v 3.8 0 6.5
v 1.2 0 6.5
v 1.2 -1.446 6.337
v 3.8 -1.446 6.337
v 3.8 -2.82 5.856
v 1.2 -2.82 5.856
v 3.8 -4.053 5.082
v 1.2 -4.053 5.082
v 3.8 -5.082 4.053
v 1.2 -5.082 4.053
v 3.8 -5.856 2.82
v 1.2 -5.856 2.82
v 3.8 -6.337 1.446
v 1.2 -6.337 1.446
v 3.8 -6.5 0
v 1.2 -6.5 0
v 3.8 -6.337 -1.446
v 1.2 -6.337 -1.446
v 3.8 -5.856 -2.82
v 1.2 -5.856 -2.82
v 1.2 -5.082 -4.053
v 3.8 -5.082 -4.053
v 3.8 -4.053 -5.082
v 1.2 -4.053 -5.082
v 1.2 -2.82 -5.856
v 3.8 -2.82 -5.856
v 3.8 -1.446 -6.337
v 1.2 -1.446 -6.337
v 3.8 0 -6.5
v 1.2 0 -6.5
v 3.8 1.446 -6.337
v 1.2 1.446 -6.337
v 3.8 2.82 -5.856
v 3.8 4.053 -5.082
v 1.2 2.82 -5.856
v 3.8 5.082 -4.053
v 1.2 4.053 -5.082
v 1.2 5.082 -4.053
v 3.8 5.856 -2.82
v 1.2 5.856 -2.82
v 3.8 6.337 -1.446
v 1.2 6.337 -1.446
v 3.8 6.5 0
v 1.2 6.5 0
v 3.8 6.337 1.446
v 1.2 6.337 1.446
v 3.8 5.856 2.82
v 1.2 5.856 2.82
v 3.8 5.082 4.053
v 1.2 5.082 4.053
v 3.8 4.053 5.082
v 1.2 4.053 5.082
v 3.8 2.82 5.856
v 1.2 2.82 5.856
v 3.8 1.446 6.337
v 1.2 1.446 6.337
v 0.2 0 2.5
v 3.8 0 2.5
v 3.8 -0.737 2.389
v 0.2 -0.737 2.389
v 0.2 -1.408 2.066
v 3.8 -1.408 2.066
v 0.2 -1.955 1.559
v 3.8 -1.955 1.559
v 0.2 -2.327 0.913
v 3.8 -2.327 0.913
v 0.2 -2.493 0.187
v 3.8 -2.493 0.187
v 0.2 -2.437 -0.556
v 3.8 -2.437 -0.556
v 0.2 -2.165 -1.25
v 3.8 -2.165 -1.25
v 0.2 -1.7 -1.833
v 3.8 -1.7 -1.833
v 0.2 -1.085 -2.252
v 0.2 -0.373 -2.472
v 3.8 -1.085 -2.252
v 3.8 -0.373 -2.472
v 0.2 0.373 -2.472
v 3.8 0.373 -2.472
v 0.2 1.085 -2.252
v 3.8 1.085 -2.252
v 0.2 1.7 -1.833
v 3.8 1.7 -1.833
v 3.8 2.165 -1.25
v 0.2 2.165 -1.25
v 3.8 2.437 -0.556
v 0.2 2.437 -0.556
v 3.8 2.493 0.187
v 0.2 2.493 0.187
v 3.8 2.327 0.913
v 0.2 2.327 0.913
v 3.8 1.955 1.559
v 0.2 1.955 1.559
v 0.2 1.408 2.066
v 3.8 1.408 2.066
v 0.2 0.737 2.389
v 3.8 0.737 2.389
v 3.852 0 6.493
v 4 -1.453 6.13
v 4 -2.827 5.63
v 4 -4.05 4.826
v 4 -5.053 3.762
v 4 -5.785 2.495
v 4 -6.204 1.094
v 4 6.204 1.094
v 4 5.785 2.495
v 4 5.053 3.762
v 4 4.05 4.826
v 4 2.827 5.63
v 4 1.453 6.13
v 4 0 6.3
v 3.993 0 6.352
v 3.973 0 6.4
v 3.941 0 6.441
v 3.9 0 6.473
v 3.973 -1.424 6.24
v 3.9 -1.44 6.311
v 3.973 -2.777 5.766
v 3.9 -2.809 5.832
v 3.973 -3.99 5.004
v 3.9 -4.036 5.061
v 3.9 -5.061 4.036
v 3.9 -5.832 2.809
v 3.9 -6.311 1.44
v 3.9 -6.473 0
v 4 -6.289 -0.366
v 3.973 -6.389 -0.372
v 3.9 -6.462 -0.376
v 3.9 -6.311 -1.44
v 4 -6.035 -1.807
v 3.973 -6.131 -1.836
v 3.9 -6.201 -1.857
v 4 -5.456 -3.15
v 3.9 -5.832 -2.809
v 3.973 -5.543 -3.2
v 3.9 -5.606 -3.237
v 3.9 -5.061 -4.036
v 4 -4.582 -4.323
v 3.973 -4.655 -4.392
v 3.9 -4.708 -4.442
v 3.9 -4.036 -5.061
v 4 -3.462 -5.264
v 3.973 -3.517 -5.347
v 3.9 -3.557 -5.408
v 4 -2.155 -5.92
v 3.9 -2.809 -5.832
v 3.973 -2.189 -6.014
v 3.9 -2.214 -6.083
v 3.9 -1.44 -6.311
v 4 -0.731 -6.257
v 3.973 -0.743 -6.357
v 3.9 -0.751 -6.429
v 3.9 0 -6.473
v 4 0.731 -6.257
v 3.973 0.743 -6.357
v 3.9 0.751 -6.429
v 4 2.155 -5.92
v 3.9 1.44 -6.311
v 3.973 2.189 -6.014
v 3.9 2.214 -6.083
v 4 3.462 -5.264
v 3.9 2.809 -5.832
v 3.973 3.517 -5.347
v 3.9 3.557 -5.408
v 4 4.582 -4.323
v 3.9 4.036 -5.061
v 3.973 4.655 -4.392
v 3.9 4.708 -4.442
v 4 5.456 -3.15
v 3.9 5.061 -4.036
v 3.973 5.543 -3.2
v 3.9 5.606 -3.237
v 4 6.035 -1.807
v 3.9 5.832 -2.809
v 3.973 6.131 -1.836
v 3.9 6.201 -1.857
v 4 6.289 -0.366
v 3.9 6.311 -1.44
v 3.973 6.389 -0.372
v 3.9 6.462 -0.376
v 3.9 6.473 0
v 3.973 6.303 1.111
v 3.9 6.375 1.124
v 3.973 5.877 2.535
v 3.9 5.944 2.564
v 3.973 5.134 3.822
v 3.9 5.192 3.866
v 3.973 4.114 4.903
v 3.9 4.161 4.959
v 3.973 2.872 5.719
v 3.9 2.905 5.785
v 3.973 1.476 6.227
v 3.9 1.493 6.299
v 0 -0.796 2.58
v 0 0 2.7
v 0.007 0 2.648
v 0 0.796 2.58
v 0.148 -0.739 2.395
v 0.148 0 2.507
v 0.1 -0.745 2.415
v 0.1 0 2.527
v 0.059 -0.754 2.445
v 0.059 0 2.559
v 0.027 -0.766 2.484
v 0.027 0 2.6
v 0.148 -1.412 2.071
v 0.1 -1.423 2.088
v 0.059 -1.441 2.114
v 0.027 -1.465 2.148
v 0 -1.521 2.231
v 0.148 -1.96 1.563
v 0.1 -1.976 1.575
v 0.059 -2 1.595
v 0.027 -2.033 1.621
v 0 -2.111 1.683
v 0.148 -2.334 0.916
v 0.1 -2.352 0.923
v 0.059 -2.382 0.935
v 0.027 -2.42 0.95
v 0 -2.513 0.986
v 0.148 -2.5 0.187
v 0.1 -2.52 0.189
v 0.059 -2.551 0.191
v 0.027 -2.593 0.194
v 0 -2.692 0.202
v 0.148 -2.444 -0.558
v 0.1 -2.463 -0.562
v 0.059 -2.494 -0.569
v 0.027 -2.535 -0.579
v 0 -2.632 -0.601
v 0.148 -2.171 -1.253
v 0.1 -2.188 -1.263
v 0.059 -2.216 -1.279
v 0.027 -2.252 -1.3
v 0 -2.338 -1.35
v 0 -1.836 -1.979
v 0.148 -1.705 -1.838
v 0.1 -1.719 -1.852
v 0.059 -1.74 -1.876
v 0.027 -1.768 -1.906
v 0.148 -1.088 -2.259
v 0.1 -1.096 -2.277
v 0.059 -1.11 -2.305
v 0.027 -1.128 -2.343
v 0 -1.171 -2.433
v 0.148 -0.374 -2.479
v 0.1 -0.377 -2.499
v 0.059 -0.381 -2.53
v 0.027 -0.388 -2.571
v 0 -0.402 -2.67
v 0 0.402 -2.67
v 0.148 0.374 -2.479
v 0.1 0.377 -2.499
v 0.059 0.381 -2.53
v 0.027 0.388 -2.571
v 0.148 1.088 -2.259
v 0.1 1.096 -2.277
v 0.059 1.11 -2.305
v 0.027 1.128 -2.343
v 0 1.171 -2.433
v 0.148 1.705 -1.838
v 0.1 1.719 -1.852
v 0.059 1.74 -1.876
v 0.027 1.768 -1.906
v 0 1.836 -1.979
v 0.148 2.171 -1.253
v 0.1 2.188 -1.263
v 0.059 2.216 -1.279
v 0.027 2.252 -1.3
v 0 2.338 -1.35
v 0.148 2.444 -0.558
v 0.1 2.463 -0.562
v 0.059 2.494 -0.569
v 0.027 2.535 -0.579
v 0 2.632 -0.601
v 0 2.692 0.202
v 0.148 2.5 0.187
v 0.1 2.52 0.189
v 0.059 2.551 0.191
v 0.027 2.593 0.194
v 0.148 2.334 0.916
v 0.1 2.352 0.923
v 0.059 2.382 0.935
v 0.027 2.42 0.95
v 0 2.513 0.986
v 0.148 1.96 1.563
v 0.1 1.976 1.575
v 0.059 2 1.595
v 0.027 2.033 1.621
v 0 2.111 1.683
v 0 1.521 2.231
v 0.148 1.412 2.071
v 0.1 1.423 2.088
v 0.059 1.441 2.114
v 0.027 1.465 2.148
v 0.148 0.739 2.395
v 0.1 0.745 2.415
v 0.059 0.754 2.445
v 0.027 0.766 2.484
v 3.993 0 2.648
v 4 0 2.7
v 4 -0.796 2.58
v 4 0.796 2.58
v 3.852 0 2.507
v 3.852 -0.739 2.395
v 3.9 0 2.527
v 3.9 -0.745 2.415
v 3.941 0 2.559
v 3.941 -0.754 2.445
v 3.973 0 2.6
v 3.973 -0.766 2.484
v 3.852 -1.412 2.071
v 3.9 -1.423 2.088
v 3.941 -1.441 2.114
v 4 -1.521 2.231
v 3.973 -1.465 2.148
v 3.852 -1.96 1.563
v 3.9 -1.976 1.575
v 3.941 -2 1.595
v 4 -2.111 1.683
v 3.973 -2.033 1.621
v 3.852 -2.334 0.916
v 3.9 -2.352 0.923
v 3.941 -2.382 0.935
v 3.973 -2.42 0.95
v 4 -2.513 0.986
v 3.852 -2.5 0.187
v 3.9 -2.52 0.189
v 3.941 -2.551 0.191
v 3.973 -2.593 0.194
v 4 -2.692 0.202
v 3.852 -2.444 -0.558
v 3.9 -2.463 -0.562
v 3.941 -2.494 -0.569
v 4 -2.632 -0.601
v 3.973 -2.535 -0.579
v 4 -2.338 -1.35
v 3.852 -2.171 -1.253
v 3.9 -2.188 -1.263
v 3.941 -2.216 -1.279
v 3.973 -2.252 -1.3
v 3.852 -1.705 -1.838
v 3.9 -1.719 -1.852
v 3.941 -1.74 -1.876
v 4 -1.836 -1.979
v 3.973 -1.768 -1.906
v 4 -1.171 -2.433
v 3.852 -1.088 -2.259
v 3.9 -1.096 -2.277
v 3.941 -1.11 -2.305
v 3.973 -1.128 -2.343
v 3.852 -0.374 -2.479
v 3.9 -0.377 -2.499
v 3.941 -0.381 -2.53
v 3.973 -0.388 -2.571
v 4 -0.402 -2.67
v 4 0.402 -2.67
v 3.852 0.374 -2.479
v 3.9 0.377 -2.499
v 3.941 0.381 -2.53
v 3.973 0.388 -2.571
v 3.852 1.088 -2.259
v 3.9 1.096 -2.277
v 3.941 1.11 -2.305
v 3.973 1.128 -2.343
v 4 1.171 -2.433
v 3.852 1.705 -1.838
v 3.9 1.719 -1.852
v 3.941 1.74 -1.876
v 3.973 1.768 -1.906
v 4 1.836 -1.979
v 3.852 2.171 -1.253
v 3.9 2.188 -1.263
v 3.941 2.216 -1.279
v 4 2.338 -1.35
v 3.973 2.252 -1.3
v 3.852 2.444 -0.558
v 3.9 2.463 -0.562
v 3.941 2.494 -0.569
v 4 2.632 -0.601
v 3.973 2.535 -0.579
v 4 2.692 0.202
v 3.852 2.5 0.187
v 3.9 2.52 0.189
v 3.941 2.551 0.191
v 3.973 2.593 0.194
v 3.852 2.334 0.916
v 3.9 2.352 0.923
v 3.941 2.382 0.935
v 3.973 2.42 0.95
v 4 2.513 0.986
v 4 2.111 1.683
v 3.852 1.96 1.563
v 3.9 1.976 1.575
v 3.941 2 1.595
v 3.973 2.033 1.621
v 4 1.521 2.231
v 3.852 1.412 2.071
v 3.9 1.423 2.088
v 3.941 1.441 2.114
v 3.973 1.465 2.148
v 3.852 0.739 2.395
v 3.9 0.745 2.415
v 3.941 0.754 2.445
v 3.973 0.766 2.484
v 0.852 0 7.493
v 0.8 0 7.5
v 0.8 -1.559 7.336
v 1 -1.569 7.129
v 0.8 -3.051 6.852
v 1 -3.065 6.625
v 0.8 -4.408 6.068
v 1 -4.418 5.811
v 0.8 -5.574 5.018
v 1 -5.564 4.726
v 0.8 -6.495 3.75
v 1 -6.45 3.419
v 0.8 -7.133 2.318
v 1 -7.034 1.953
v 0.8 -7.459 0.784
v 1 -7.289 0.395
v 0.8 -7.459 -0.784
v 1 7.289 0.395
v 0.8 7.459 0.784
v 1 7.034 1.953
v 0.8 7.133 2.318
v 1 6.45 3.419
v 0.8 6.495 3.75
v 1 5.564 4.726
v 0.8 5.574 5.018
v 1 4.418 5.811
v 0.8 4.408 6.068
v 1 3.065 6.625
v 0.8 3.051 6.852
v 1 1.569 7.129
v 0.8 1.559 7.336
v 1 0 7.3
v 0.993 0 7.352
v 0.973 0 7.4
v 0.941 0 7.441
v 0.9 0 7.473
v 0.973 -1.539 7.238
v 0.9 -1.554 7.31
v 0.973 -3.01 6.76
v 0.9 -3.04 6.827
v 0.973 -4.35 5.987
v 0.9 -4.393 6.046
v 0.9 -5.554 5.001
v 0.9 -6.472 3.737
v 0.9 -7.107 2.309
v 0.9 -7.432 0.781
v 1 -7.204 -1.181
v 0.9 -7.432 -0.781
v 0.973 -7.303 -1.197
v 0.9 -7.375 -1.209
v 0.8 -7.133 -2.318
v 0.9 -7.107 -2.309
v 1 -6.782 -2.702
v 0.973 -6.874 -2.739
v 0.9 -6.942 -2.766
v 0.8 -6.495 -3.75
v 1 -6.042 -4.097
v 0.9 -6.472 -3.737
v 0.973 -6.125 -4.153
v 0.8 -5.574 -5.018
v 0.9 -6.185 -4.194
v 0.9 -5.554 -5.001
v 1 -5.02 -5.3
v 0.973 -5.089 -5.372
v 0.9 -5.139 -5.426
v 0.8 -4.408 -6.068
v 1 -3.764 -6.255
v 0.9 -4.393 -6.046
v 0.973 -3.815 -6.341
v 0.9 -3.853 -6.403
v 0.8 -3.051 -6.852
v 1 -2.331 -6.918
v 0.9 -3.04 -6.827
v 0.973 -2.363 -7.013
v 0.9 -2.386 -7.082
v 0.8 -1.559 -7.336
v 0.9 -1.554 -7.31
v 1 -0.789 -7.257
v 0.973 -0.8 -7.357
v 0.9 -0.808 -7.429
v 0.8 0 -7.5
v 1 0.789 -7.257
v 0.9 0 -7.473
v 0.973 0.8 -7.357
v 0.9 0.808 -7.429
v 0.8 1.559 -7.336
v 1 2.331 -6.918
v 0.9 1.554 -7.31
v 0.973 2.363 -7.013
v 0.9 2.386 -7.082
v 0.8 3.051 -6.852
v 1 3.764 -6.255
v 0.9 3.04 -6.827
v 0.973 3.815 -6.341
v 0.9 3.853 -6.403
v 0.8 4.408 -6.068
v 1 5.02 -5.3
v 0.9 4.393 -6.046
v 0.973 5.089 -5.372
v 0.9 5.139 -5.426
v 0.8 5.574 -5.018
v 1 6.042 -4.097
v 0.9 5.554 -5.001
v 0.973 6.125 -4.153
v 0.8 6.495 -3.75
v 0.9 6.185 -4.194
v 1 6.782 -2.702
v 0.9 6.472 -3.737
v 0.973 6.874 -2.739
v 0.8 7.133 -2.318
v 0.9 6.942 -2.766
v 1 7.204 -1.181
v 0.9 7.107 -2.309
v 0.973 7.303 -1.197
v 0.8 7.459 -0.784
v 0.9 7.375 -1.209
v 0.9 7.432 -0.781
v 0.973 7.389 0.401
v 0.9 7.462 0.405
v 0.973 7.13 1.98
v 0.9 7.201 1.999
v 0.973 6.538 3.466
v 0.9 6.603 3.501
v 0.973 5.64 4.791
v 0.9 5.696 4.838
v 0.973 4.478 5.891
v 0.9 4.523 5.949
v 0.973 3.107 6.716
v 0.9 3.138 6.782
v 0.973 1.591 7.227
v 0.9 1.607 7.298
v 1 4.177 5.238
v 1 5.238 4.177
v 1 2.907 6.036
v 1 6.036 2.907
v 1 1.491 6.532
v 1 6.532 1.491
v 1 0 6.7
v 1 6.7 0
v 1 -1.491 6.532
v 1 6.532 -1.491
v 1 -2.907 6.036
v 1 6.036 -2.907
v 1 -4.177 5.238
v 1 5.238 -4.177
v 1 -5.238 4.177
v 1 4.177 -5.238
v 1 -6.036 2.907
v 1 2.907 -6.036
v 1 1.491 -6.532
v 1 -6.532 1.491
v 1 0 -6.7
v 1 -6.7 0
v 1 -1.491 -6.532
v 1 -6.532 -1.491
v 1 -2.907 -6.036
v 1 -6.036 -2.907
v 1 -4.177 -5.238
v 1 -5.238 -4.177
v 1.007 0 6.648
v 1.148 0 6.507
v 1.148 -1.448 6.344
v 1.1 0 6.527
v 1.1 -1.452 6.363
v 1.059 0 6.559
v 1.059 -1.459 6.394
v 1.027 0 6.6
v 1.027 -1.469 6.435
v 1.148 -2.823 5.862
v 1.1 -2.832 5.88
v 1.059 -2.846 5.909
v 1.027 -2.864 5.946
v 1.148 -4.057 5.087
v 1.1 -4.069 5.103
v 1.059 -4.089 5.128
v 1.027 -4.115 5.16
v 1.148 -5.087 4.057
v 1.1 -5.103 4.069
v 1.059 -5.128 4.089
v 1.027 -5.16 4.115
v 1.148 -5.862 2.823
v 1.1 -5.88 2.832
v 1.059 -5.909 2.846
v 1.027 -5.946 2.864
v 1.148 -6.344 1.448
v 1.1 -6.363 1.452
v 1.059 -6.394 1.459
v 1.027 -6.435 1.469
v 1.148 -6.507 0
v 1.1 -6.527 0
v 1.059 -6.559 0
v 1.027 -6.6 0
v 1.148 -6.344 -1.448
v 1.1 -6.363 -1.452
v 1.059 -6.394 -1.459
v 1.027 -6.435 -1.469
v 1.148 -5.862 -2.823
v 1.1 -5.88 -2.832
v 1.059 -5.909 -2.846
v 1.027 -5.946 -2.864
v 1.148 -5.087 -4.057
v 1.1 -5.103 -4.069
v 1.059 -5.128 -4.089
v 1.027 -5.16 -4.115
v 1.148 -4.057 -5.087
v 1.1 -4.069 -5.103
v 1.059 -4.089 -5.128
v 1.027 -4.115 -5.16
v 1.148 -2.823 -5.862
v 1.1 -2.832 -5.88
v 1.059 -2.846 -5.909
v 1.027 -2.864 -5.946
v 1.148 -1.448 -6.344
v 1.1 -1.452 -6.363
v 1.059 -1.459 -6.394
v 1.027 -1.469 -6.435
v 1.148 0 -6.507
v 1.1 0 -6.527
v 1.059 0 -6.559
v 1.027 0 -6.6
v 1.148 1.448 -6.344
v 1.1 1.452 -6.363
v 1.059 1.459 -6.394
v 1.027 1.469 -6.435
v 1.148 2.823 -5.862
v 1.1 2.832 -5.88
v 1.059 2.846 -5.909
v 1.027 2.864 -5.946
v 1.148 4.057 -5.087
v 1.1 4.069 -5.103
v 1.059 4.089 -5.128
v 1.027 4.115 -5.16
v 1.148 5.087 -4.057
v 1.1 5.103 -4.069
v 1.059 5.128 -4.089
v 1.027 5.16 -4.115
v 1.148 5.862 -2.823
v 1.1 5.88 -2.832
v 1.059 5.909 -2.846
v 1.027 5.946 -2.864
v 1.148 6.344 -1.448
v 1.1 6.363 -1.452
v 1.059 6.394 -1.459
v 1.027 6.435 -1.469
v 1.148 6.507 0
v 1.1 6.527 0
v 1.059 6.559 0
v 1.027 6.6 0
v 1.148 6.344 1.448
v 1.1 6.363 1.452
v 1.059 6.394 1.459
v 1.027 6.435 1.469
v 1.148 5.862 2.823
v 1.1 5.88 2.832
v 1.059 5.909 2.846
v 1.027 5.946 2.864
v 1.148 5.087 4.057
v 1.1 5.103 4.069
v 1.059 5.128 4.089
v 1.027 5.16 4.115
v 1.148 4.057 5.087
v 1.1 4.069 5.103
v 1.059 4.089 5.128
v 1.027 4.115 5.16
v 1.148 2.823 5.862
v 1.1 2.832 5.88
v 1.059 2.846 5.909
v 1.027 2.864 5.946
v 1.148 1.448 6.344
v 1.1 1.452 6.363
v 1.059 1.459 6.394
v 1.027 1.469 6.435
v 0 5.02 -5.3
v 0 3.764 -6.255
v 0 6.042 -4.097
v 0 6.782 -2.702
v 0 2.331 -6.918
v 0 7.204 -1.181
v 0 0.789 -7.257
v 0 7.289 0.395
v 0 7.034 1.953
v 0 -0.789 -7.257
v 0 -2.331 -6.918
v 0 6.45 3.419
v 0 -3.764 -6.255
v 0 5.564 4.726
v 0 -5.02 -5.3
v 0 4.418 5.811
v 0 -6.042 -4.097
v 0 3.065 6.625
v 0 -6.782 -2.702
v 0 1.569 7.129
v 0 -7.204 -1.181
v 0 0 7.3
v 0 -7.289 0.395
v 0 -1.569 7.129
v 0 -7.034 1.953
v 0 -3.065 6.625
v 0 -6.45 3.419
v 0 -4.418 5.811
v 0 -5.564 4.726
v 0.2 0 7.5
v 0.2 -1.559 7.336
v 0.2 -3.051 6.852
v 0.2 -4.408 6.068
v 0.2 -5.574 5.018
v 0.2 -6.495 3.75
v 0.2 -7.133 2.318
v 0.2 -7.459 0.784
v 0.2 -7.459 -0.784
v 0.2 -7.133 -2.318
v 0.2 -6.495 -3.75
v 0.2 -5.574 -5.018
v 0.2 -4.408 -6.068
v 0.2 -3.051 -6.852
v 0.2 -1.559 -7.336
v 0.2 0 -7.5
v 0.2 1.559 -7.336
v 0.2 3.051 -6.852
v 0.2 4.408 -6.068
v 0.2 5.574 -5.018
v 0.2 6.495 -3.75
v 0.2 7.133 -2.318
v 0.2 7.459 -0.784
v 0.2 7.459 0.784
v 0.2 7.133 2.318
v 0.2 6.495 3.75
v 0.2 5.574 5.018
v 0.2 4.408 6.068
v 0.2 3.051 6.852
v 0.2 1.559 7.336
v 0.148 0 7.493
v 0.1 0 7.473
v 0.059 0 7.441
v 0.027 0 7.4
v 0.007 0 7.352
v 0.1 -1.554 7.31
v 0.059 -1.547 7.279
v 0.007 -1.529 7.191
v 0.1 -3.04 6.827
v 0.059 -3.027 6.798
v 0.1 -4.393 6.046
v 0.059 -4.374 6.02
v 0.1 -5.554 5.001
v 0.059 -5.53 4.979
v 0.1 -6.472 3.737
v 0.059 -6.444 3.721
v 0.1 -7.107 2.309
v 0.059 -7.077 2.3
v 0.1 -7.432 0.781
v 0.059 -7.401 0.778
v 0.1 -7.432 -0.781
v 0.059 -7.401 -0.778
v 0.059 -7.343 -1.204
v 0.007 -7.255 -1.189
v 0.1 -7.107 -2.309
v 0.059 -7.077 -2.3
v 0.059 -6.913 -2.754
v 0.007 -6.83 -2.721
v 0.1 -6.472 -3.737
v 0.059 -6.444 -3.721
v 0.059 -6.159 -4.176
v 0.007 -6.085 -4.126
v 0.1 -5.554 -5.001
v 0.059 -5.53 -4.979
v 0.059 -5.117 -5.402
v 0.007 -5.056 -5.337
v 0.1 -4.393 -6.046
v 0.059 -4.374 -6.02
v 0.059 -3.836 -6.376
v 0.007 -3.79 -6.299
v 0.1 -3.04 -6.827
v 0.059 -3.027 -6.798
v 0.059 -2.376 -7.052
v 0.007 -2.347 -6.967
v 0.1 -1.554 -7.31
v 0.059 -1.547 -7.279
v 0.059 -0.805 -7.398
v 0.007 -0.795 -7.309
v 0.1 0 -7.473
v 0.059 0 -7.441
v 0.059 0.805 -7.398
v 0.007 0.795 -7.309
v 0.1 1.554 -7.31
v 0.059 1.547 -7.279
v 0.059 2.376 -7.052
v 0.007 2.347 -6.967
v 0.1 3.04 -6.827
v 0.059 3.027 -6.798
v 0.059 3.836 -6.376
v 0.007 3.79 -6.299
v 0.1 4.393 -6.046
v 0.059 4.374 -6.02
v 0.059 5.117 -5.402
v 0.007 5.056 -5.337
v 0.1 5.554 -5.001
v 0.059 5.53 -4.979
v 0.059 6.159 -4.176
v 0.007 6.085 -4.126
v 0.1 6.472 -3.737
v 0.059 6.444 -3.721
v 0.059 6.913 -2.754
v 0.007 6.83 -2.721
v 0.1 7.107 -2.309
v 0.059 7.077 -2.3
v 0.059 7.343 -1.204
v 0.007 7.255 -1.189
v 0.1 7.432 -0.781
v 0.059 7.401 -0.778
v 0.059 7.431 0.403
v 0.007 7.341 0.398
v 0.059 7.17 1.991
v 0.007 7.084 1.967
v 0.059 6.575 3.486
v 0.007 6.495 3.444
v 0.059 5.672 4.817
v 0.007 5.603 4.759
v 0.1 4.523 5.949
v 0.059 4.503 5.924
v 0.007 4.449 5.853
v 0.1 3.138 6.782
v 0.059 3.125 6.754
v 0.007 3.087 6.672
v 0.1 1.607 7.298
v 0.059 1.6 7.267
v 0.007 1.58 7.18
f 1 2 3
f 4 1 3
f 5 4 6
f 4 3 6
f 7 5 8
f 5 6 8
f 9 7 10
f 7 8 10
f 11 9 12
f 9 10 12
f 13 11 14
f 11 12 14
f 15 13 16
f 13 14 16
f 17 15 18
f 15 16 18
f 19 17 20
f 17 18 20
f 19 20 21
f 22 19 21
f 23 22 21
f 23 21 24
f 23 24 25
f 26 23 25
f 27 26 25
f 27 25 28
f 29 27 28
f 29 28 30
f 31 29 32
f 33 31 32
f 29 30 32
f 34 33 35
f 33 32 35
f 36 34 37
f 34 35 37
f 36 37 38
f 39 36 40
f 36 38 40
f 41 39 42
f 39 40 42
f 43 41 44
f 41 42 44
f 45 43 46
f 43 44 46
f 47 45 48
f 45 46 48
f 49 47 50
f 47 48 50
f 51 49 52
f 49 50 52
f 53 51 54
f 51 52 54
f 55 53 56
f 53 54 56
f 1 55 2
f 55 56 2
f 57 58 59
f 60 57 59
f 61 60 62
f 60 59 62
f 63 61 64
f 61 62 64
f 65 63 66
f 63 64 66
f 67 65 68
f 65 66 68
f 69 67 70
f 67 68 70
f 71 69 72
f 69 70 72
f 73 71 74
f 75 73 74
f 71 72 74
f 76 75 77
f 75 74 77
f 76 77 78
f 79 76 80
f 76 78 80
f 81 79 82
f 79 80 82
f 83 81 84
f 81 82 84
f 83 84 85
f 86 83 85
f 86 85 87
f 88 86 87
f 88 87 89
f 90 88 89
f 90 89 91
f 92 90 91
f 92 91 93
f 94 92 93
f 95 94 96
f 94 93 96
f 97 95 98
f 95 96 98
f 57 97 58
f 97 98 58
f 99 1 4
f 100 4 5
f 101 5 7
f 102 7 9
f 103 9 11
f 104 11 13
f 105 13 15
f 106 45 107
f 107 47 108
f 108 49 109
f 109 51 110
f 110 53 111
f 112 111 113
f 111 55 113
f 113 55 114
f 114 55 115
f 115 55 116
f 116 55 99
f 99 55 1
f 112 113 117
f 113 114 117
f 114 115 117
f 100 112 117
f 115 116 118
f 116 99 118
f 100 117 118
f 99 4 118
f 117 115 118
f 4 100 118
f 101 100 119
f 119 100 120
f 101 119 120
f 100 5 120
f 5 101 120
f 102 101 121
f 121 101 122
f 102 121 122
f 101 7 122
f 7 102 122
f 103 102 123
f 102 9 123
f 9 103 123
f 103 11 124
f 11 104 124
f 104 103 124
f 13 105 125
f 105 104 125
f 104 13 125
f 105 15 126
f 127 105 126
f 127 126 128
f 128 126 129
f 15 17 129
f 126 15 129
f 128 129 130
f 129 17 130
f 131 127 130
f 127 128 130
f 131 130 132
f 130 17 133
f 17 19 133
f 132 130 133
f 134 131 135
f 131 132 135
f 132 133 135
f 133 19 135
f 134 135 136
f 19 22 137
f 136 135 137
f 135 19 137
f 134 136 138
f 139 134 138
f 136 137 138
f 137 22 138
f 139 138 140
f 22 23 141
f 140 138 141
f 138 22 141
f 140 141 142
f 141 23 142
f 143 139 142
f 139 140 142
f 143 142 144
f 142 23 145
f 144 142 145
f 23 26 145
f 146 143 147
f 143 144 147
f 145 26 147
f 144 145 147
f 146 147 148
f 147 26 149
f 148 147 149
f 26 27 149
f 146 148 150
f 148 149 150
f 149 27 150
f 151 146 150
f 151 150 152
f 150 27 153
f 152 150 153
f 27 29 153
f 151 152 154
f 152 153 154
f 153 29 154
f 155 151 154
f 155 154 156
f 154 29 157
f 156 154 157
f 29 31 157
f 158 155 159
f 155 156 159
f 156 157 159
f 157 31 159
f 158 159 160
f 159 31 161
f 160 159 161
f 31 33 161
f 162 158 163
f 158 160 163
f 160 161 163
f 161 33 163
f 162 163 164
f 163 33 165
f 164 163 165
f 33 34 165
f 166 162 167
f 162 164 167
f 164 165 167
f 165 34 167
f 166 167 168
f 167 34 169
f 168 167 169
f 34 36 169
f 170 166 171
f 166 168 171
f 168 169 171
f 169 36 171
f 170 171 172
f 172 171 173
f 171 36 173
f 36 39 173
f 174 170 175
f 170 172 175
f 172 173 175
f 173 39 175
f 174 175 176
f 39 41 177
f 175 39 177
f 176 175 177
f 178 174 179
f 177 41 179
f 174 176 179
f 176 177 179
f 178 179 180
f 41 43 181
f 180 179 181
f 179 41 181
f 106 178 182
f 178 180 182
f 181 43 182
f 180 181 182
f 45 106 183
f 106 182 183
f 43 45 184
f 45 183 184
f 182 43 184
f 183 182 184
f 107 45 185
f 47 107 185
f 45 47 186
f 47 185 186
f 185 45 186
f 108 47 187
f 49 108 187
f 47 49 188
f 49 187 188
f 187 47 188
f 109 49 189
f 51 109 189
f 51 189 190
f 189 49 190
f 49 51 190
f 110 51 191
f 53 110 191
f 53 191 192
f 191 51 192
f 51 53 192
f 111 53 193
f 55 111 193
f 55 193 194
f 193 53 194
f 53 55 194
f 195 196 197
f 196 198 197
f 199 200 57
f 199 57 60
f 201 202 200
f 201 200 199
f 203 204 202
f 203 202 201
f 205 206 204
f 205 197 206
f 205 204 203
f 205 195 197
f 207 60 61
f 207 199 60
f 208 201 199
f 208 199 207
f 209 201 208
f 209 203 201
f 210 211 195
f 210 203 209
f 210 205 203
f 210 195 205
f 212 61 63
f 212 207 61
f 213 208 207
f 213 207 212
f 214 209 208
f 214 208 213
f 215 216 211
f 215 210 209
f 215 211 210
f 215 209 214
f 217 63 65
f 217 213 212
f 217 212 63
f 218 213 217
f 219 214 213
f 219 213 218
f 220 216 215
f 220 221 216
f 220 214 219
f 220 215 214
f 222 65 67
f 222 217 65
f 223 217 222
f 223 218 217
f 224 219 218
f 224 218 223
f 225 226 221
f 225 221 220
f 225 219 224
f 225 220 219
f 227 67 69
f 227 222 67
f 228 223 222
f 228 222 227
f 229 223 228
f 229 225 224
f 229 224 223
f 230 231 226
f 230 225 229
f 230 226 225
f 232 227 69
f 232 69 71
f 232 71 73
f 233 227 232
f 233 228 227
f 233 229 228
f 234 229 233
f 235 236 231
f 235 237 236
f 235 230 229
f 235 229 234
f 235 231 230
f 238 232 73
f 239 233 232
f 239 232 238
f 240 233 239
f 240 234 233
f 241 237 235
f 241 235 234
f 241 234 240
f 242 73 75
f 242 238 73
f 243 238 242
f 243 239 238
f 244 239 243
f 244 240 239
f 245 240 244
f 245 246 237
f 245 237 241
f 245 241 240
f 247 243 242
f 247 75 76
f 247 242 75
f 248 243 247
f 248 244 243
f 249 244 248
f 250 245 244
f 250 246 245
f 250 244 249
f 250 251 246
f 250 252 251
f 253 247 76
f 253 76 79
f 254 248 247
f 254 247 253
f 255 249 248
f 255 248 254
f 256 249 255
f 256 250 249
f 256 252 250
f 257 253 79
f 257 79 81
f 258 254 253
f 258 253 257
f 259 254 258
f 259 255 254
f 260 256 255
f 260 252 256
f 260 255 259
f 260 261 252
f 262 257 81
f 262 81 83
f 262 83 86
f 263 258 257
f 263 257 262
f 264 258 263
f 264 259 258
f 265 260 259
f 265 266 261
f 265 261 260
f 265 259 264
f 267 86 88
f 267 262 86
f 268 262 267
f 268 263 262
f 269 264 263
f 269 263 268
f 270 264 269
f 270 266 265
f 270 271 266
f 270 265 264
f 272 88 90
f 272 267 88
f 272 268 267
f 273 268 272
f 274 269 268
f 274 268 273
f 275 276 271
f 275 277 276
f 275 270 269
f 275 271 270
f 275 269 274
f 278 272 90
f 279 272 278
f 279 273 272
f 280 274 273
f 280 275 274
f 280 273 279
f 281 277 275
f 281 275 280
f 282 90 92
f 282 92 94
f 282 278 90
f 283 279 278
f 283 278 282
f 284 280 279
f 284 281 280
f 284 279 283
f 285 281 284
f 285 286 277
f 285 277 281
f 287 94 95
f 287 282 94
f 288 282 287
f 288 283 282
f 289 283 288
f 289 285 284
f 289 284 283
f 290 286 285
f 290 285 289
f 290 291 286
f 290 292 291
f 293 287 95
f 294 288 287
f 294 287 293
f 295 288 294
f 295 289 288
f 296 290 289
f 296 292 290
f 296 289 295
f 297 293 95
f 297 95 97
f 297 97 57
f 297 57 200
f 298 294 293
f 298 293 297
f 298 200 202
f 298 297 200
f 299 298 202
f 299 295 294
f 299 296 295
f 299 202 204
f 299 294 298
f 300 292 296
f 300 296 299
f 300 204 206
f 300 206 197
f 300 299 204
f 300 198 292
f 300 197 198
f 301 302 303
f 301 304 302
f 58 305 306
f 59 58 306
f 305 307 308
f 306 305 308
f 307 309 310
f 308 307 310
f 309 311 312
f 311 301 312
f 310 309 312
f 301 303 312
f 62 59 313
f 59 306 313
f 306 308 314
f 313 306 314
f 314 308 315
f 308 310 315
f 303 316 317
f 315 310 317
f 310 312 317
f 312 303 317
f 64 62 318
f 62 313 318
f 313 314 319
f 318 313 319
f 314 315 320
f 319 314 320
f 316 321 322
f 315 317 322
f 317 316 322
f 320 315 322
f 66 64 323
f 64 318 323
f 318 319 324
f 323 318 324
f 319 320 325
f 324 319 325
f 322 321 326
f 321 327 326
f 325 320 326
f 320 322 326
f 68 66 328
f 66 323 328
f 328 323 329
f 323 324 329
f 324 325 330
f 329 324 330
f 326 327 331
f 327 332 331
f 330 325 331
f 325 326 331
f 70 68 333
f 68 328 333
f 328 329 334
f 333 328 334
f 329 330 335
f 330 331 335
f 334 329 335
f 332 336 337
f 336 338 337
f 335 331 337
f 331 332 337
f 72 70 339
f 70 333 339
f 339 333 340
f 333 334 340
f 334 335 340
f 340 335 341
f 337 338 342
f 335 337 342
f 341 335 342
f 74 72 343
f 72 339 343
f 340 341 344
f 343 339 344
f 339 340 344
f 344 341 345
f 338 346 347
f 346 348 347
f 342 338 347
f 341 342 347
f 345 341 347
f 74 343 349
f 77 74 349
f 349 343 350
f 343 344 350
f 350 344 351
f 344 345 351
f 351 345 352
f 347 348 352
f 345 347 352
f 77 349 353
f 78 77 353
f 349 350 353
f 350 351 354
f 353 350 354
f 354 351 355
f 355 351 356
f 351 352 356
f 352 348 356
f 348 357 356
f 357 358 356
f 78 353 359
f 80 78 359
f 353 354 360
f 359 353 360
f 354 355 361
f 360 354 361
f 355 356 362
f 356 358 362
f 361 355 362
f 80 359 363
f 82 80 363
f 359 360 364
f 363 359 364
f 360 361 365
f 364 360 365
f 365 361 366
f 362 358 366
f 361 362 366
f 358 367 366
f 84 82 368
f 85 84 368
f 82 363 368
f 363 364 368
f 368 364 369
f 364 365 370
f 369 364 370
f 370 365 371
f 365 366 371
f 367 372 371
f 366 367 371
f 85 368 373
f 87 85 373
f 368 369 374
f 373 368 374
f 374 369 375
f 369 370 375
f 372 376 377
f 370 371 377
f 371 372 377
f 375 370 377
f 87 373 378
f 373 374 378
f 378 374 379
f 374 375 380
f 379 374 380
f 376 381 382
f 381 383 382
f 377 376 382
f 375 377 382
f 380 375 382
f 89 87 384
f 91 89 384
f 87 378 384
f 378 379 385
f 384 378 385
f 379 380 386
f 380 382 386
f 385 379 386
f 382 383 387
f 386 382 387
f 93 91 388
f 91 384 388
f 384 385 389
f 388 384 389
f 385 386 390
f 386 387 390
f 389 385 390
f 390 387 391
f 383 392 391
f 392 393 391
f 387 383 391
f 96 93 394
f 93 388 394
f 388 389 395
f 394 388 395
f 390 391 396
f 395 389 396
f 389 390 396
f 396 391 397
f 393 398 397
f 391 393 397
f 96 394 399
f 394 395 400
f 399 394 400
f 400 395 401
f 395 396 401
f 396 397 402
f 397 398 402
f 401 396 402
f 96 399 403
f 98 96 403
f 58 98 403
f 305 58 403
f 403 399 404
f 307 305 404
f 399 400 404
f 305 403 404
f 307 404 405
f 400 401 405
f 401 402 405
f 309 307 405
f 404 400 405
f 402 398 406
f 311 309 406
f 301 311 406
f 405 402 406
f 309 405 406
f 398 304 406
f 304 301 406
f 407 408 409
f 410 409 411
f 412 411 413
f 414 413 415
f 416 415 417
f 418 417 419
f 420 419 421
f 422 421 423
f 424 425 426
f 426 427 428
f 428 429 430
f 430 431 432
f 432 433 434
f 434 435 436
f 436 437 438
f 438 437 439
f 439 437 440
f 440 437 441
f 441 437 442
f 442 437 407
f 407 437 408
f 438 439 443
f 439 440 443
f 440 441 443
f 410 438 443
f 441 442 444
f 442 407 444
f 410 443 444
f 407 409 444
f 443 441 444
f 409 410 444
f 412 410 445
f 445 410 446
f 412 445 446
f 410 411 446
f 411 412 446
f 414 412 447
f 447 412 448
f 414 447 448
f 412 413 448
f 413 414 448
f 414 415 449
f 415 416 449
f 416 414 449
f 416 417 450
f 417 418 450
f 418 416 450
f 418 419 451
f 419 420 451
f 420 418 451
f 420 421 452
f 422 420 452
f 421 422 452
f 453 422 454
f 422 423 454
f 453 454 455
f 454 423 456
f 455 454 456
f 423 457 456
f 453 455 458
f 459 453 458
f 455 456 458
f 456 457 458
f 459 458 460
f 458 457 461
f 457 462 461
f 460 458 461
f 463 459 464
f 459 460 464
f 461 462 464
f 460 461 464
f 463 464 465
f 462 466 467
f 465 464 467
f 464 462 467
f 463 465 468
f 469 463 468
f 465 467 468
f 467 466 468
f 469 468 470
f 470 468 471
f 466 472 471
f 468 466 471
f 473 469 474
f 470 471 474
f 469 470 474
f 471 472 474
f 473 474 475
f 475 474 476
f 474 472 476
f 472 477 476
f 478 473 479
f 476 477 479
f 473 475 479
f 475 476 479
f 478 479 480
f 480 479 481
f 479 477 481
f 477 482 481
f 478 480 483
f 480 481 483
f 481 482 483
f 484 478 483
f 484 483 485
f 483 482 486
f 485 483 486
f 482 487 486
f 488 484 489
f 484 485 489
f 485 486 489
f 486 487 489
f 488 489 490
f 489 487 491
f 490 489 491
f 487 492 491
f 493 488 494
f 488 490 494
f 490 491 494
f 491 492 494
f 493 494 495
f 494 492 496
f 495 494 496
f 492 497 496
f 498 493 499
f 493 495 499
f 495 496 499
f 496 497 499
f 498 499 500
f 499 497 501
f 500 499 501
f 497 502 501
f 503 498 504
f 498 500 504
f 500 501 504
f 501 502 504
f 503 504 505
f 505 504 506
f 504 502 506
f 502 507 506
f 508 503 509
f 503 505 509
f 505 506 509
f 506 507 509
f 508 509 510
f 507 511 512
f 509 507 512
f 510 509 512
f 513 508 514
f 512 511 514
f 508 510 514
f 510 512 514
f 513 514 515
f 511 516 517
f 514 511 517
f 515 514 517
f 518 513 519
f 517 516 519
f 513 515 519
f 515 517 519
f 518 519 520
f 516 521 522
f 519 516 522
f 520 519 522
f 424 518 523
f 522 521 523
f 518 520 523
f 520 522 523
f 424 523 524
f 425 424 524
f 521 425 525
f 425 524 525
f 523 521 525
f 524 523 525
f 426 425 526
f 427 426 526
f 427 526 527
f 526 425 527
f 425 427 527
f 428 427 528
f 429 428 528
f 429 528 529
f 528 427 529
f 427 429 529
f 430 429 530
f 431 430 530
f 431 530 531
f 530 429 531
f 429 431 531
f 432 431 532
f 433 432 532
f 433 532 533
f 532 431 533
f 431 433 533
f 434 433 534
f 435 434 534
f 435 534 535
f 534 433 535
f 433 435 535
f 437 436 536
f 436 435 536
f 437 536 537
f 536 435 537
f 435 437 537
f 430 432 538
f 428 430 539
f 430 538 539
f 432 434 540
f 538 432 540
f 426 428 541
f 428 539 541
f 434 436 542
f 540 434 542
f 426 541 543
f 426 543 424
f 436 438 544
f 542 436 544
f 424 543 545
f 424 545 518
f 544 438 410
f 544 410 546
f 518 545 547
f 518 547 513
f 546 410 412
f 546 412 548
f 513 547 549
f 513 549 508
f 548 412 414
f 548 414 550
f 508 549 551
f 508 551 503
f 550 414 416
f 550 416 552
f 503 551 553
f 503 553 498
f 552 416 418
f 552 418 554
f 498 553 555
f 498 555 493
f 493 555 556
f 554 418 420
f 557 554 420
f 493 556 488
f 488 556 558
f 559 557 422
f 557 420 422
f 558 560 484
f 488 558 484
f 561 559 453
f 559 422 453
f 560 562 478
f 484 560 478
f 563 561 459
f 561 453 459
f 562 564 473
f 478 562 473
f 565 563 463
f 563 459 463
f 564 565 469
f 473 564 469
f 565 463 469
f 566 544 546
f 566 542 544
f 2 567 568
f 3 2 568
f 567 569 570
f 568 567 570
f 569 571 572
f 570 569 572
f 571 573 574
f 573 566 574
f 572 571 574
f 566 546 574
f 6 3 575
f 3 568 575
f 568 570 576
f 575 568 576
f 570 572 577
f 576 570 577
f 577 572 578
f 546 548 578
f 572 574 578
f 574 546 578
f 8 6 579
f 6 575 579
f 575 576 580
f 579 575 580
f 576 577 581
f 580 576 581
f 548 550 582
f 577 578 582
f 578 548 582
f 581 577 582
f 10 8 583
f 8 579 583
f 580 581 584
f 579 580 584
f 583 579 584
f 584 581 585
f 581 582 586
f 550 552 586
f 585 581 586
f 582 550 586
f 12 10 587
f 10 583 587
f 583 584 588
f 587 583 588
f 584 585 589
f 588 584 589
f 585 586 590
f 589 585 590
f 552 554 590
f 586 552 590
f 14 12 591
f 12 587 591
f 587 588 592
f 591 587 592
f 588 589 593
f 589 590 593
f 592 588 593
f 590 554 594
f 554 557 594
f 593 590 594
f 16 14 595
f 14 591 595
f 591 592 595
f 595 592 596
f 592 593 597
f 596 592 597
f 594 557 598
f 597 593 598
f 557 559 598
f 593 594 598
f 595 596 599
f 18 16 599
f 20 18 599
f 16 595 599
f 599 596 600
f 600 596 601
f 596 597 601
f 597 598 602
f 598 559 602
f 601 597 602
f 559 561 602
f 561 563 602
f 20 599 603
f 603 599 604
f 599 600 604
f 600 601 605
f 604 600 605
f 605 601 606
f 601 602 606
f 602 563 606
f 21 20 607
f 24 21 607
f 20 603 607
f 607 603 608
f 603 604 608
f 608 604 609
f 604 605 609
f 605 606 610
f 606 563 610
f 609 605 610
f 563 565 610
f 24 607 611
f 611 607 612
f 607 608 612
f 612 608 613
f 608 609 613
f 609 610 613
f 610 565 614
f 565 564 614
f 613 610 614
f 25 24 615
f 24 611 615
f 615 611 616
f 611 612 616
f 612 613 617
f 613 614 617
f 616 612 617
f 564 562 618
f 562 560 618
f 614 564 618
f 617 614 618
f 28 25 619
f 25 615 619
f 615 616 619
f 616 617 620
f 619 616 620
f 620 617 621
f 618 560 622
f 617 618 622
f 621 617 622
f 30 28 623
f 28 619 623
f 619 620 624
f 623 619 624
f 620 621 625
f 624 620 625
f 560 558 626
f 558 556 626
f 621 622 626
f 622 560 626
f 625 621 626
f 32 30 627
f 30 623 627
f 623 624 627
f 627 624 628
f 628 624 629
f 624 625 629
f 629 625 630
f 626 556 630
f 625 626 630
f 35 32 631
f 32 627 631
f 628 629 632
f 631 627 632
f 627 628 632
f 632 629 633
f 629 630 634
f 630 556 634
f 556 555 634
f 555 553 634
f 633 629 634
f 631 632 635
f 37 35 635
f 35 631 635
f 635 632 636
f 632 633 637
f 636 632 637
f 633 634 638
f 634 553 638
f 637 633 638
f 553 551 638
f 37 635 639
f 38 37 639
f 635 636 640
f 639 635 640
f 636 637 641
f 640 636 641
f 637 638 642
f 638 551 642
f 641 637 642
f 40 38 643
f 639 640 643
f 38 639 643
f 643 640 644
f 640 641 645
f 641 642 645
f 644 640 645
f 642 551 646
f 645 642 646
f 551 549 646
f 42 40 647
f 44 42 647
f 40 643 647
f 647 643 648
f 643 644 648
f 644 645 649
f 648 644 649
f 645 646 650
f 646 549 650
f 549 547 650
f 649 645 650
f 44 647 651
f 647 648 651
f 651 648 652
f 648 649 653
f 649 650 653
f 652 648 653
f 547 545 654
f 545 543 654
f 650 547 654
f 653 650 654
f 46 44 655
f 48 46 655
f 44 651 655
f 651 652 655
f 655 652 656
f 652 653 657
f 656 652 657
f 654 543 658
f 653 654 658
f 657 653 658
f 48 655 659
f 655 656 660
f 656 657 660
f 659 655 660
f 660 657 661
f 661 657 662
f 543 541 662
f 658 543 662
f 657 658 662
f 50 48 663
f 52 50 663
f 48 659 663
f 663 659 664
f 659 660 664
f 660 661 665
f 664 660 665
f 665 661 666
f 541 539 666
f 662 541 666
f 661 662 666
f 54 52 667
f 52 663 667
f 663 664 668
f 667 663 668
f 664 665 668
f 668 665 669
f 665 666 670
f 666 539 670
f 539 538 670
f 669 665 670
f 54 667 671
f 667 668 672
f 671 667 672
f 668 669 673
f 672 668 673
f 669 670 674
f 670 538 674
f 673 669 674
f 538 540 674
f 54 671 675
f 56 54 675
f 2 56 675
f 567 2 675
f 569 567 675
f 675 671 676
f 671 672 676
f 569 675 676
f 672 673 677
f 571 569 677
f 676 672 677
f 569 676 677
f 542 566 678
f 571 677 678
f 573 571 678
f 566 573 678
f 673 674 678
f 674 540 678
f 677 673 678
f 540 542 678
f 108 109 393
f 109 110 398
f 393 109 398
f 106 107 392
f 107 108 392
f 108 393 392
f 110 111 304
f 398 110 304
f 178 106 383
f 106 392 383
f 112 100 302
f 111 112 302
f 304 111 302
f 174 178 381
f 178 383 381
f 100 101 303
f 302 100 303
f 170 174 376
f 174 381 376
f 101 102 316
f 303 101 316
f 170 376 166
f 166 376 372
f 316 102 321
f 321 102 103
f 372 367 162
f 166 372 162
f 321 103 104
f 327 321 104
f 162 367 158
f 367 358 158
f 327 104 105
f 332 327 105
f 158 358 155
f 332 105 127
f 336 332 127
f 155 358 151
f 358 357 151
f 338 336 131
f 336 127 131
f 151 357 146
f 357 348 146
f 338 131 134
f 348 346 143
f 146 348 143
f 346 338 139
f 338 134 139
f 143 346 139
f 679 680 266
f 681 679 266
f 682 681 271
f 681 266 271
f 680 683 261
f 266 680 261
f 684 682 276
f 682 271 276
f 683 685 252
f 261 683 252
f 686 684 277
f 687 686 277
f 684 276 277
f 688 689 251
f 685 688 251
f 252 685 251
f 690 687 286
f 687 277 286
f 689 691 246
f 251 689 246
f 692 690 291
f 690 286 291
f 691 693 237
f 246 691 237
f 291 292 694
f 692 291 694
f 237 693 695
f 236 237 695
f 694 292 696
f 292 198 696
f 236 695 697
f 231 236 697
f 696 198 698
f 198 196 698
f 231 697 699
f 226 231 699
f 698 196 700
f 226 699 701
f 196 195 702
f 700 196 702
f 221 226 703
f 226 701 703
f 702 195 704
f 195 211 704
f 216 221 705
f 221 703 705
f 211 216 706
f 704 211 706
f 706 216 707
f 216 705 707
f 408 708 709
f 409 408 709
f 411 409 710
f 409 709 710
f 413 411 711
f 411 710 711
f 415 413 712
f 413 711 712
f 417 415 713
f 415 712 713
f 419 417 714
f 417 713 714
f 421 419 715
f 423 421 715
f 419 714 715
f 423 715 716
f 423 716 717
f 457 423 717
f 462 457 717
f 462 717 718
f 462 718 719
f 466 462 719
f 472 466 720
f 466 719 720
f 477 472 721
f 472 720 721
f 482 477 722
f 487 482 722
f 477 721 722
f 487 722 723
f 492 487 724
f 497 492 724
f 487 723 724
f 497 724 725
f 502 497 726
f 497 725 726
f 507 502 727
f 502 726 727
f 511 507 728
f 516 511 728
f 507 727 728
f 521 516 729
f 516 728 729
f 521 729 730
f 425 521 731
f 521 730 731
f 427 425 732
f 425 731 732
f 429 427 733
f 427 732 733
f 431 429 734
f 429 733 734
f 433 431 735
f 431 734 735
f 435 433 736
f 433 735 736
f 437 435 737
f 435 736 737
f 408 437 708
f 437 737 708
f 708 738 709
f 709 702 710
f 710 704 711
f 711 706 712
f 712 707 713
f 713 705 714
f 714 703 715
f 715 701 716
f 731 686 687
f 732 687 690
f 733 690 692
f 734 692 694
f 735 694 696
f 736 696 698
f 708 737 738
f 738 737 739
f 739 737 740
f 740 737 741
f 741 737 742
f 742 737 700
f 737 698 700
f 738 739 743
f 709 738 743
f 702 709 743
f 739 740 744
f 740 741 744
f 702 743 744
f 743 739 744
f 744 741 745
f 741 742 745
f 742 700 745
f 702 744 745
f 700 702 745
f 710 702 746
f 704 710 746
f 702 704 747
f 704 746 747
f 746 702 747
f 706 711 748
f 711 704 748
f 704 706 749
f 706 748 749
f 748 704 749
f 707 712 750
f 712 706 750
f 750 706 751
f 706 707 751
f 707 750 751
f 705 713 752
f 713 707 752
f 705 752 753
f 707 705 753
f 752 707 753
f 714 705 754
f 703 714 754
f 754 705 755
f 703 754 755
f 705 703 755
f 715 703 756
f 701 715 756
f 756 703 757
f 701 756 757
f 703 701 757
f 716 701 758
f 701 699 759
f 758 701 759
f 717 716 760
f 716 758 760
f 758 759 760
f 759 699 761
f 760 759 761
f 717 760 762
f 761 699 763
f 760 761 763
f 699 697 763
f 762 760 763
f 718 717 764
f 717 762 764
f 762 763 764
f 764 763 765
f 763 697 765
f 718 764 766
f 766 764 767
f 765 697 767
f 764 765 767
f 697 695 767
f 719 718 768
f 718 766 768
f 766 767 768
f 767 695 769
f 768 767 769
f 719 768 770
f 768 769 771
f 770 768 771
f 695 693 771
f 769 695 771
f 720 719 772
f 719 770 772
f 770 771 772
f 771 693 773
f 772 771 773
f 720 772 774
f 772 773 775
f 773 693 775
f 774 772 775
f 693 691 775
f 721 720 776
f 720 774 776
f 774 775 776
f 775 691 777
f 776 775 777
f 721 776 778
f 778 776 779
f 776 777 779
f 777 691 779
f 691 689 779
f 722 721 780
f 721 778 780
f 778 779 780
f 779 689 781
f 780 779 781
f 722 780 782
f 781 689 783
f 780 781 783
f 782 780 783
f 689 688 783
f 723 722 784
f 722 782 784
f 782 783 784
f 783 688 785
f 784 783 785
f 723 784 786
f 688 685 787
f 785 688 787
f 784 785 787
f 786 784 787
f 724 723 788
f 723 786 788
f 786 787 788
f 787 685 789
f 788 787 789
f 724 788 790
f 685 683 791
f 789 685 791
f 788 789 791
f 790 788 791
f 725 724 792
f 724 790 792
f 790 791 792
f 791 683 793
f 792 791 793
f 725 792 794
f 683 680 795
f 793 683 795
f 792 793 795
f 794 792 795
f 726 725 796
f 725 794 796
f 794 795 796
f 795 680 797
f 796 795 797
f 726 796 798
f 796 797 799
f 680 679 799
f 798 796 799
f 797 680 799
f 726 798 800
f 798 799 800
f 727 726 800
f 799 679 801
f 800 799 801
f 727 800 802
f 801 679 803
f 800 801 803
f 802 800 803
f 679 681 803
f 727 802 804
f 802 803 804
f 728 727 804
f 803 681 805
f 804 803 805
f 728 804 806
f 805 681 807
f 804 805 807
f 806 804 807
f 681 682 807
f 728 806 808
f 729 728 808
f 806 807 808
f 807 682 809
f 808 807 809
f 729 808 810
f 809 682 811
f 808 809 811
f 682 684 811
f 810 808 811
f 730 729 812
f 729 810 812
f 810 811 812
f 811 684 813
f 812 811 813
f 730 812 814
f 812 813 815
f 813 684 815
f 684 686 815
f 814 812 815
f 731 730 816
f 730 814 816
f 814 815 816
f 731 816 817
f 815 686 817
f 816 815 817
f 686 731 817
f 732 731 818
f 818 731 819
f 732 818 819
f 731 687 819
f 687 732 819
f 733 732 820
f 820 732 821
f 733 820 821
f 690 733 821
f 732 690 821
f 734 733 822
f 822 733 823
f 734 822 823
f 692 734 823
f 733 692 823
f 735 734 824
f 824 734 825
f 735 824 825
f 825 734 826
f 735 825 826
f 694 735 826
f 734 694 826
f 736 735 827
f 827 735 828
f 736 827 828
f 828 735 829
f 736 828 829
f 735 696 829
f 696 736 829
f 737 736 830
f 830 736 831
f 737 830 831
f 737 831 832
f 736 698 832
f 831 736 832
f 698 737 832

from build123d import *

# Parameters (mm, degrees)
FILLET1_R = 0.2


with BuildPart() as part:
    # Main Revolve Sketch → Main Revolve (revolve)
    with BuildSketch(Plane.XY, mode=Mode.PRIVATE) as main_revolve_sk:
        Polygon((0, 2.5), (4, 2.5), (4, 6.5), (1, 6.5), (1, 7.5), (0, 7.5), align=None)
    revolve(main_revolve_sk.sketch.rotate(Axis((0, 0, 0), (1, 0, 0)), 90), axis=Axis((0, 0, 0), (1, 0, 0)))

    # Fillet1
    fillet1_edges = [part.edges().sort_by_distance(p)[0] for p in [
        (0, 0, -7.5),
        (1, 0, -7.5),
        (1, 0, -6.5),
        (4, 0, -6.5),
        (4, 0, -2.5),
        (0, 0, -2.5),
    ]]
    fillet(fillet1_edges, radius=FILLET1_R)


solid = part.part
